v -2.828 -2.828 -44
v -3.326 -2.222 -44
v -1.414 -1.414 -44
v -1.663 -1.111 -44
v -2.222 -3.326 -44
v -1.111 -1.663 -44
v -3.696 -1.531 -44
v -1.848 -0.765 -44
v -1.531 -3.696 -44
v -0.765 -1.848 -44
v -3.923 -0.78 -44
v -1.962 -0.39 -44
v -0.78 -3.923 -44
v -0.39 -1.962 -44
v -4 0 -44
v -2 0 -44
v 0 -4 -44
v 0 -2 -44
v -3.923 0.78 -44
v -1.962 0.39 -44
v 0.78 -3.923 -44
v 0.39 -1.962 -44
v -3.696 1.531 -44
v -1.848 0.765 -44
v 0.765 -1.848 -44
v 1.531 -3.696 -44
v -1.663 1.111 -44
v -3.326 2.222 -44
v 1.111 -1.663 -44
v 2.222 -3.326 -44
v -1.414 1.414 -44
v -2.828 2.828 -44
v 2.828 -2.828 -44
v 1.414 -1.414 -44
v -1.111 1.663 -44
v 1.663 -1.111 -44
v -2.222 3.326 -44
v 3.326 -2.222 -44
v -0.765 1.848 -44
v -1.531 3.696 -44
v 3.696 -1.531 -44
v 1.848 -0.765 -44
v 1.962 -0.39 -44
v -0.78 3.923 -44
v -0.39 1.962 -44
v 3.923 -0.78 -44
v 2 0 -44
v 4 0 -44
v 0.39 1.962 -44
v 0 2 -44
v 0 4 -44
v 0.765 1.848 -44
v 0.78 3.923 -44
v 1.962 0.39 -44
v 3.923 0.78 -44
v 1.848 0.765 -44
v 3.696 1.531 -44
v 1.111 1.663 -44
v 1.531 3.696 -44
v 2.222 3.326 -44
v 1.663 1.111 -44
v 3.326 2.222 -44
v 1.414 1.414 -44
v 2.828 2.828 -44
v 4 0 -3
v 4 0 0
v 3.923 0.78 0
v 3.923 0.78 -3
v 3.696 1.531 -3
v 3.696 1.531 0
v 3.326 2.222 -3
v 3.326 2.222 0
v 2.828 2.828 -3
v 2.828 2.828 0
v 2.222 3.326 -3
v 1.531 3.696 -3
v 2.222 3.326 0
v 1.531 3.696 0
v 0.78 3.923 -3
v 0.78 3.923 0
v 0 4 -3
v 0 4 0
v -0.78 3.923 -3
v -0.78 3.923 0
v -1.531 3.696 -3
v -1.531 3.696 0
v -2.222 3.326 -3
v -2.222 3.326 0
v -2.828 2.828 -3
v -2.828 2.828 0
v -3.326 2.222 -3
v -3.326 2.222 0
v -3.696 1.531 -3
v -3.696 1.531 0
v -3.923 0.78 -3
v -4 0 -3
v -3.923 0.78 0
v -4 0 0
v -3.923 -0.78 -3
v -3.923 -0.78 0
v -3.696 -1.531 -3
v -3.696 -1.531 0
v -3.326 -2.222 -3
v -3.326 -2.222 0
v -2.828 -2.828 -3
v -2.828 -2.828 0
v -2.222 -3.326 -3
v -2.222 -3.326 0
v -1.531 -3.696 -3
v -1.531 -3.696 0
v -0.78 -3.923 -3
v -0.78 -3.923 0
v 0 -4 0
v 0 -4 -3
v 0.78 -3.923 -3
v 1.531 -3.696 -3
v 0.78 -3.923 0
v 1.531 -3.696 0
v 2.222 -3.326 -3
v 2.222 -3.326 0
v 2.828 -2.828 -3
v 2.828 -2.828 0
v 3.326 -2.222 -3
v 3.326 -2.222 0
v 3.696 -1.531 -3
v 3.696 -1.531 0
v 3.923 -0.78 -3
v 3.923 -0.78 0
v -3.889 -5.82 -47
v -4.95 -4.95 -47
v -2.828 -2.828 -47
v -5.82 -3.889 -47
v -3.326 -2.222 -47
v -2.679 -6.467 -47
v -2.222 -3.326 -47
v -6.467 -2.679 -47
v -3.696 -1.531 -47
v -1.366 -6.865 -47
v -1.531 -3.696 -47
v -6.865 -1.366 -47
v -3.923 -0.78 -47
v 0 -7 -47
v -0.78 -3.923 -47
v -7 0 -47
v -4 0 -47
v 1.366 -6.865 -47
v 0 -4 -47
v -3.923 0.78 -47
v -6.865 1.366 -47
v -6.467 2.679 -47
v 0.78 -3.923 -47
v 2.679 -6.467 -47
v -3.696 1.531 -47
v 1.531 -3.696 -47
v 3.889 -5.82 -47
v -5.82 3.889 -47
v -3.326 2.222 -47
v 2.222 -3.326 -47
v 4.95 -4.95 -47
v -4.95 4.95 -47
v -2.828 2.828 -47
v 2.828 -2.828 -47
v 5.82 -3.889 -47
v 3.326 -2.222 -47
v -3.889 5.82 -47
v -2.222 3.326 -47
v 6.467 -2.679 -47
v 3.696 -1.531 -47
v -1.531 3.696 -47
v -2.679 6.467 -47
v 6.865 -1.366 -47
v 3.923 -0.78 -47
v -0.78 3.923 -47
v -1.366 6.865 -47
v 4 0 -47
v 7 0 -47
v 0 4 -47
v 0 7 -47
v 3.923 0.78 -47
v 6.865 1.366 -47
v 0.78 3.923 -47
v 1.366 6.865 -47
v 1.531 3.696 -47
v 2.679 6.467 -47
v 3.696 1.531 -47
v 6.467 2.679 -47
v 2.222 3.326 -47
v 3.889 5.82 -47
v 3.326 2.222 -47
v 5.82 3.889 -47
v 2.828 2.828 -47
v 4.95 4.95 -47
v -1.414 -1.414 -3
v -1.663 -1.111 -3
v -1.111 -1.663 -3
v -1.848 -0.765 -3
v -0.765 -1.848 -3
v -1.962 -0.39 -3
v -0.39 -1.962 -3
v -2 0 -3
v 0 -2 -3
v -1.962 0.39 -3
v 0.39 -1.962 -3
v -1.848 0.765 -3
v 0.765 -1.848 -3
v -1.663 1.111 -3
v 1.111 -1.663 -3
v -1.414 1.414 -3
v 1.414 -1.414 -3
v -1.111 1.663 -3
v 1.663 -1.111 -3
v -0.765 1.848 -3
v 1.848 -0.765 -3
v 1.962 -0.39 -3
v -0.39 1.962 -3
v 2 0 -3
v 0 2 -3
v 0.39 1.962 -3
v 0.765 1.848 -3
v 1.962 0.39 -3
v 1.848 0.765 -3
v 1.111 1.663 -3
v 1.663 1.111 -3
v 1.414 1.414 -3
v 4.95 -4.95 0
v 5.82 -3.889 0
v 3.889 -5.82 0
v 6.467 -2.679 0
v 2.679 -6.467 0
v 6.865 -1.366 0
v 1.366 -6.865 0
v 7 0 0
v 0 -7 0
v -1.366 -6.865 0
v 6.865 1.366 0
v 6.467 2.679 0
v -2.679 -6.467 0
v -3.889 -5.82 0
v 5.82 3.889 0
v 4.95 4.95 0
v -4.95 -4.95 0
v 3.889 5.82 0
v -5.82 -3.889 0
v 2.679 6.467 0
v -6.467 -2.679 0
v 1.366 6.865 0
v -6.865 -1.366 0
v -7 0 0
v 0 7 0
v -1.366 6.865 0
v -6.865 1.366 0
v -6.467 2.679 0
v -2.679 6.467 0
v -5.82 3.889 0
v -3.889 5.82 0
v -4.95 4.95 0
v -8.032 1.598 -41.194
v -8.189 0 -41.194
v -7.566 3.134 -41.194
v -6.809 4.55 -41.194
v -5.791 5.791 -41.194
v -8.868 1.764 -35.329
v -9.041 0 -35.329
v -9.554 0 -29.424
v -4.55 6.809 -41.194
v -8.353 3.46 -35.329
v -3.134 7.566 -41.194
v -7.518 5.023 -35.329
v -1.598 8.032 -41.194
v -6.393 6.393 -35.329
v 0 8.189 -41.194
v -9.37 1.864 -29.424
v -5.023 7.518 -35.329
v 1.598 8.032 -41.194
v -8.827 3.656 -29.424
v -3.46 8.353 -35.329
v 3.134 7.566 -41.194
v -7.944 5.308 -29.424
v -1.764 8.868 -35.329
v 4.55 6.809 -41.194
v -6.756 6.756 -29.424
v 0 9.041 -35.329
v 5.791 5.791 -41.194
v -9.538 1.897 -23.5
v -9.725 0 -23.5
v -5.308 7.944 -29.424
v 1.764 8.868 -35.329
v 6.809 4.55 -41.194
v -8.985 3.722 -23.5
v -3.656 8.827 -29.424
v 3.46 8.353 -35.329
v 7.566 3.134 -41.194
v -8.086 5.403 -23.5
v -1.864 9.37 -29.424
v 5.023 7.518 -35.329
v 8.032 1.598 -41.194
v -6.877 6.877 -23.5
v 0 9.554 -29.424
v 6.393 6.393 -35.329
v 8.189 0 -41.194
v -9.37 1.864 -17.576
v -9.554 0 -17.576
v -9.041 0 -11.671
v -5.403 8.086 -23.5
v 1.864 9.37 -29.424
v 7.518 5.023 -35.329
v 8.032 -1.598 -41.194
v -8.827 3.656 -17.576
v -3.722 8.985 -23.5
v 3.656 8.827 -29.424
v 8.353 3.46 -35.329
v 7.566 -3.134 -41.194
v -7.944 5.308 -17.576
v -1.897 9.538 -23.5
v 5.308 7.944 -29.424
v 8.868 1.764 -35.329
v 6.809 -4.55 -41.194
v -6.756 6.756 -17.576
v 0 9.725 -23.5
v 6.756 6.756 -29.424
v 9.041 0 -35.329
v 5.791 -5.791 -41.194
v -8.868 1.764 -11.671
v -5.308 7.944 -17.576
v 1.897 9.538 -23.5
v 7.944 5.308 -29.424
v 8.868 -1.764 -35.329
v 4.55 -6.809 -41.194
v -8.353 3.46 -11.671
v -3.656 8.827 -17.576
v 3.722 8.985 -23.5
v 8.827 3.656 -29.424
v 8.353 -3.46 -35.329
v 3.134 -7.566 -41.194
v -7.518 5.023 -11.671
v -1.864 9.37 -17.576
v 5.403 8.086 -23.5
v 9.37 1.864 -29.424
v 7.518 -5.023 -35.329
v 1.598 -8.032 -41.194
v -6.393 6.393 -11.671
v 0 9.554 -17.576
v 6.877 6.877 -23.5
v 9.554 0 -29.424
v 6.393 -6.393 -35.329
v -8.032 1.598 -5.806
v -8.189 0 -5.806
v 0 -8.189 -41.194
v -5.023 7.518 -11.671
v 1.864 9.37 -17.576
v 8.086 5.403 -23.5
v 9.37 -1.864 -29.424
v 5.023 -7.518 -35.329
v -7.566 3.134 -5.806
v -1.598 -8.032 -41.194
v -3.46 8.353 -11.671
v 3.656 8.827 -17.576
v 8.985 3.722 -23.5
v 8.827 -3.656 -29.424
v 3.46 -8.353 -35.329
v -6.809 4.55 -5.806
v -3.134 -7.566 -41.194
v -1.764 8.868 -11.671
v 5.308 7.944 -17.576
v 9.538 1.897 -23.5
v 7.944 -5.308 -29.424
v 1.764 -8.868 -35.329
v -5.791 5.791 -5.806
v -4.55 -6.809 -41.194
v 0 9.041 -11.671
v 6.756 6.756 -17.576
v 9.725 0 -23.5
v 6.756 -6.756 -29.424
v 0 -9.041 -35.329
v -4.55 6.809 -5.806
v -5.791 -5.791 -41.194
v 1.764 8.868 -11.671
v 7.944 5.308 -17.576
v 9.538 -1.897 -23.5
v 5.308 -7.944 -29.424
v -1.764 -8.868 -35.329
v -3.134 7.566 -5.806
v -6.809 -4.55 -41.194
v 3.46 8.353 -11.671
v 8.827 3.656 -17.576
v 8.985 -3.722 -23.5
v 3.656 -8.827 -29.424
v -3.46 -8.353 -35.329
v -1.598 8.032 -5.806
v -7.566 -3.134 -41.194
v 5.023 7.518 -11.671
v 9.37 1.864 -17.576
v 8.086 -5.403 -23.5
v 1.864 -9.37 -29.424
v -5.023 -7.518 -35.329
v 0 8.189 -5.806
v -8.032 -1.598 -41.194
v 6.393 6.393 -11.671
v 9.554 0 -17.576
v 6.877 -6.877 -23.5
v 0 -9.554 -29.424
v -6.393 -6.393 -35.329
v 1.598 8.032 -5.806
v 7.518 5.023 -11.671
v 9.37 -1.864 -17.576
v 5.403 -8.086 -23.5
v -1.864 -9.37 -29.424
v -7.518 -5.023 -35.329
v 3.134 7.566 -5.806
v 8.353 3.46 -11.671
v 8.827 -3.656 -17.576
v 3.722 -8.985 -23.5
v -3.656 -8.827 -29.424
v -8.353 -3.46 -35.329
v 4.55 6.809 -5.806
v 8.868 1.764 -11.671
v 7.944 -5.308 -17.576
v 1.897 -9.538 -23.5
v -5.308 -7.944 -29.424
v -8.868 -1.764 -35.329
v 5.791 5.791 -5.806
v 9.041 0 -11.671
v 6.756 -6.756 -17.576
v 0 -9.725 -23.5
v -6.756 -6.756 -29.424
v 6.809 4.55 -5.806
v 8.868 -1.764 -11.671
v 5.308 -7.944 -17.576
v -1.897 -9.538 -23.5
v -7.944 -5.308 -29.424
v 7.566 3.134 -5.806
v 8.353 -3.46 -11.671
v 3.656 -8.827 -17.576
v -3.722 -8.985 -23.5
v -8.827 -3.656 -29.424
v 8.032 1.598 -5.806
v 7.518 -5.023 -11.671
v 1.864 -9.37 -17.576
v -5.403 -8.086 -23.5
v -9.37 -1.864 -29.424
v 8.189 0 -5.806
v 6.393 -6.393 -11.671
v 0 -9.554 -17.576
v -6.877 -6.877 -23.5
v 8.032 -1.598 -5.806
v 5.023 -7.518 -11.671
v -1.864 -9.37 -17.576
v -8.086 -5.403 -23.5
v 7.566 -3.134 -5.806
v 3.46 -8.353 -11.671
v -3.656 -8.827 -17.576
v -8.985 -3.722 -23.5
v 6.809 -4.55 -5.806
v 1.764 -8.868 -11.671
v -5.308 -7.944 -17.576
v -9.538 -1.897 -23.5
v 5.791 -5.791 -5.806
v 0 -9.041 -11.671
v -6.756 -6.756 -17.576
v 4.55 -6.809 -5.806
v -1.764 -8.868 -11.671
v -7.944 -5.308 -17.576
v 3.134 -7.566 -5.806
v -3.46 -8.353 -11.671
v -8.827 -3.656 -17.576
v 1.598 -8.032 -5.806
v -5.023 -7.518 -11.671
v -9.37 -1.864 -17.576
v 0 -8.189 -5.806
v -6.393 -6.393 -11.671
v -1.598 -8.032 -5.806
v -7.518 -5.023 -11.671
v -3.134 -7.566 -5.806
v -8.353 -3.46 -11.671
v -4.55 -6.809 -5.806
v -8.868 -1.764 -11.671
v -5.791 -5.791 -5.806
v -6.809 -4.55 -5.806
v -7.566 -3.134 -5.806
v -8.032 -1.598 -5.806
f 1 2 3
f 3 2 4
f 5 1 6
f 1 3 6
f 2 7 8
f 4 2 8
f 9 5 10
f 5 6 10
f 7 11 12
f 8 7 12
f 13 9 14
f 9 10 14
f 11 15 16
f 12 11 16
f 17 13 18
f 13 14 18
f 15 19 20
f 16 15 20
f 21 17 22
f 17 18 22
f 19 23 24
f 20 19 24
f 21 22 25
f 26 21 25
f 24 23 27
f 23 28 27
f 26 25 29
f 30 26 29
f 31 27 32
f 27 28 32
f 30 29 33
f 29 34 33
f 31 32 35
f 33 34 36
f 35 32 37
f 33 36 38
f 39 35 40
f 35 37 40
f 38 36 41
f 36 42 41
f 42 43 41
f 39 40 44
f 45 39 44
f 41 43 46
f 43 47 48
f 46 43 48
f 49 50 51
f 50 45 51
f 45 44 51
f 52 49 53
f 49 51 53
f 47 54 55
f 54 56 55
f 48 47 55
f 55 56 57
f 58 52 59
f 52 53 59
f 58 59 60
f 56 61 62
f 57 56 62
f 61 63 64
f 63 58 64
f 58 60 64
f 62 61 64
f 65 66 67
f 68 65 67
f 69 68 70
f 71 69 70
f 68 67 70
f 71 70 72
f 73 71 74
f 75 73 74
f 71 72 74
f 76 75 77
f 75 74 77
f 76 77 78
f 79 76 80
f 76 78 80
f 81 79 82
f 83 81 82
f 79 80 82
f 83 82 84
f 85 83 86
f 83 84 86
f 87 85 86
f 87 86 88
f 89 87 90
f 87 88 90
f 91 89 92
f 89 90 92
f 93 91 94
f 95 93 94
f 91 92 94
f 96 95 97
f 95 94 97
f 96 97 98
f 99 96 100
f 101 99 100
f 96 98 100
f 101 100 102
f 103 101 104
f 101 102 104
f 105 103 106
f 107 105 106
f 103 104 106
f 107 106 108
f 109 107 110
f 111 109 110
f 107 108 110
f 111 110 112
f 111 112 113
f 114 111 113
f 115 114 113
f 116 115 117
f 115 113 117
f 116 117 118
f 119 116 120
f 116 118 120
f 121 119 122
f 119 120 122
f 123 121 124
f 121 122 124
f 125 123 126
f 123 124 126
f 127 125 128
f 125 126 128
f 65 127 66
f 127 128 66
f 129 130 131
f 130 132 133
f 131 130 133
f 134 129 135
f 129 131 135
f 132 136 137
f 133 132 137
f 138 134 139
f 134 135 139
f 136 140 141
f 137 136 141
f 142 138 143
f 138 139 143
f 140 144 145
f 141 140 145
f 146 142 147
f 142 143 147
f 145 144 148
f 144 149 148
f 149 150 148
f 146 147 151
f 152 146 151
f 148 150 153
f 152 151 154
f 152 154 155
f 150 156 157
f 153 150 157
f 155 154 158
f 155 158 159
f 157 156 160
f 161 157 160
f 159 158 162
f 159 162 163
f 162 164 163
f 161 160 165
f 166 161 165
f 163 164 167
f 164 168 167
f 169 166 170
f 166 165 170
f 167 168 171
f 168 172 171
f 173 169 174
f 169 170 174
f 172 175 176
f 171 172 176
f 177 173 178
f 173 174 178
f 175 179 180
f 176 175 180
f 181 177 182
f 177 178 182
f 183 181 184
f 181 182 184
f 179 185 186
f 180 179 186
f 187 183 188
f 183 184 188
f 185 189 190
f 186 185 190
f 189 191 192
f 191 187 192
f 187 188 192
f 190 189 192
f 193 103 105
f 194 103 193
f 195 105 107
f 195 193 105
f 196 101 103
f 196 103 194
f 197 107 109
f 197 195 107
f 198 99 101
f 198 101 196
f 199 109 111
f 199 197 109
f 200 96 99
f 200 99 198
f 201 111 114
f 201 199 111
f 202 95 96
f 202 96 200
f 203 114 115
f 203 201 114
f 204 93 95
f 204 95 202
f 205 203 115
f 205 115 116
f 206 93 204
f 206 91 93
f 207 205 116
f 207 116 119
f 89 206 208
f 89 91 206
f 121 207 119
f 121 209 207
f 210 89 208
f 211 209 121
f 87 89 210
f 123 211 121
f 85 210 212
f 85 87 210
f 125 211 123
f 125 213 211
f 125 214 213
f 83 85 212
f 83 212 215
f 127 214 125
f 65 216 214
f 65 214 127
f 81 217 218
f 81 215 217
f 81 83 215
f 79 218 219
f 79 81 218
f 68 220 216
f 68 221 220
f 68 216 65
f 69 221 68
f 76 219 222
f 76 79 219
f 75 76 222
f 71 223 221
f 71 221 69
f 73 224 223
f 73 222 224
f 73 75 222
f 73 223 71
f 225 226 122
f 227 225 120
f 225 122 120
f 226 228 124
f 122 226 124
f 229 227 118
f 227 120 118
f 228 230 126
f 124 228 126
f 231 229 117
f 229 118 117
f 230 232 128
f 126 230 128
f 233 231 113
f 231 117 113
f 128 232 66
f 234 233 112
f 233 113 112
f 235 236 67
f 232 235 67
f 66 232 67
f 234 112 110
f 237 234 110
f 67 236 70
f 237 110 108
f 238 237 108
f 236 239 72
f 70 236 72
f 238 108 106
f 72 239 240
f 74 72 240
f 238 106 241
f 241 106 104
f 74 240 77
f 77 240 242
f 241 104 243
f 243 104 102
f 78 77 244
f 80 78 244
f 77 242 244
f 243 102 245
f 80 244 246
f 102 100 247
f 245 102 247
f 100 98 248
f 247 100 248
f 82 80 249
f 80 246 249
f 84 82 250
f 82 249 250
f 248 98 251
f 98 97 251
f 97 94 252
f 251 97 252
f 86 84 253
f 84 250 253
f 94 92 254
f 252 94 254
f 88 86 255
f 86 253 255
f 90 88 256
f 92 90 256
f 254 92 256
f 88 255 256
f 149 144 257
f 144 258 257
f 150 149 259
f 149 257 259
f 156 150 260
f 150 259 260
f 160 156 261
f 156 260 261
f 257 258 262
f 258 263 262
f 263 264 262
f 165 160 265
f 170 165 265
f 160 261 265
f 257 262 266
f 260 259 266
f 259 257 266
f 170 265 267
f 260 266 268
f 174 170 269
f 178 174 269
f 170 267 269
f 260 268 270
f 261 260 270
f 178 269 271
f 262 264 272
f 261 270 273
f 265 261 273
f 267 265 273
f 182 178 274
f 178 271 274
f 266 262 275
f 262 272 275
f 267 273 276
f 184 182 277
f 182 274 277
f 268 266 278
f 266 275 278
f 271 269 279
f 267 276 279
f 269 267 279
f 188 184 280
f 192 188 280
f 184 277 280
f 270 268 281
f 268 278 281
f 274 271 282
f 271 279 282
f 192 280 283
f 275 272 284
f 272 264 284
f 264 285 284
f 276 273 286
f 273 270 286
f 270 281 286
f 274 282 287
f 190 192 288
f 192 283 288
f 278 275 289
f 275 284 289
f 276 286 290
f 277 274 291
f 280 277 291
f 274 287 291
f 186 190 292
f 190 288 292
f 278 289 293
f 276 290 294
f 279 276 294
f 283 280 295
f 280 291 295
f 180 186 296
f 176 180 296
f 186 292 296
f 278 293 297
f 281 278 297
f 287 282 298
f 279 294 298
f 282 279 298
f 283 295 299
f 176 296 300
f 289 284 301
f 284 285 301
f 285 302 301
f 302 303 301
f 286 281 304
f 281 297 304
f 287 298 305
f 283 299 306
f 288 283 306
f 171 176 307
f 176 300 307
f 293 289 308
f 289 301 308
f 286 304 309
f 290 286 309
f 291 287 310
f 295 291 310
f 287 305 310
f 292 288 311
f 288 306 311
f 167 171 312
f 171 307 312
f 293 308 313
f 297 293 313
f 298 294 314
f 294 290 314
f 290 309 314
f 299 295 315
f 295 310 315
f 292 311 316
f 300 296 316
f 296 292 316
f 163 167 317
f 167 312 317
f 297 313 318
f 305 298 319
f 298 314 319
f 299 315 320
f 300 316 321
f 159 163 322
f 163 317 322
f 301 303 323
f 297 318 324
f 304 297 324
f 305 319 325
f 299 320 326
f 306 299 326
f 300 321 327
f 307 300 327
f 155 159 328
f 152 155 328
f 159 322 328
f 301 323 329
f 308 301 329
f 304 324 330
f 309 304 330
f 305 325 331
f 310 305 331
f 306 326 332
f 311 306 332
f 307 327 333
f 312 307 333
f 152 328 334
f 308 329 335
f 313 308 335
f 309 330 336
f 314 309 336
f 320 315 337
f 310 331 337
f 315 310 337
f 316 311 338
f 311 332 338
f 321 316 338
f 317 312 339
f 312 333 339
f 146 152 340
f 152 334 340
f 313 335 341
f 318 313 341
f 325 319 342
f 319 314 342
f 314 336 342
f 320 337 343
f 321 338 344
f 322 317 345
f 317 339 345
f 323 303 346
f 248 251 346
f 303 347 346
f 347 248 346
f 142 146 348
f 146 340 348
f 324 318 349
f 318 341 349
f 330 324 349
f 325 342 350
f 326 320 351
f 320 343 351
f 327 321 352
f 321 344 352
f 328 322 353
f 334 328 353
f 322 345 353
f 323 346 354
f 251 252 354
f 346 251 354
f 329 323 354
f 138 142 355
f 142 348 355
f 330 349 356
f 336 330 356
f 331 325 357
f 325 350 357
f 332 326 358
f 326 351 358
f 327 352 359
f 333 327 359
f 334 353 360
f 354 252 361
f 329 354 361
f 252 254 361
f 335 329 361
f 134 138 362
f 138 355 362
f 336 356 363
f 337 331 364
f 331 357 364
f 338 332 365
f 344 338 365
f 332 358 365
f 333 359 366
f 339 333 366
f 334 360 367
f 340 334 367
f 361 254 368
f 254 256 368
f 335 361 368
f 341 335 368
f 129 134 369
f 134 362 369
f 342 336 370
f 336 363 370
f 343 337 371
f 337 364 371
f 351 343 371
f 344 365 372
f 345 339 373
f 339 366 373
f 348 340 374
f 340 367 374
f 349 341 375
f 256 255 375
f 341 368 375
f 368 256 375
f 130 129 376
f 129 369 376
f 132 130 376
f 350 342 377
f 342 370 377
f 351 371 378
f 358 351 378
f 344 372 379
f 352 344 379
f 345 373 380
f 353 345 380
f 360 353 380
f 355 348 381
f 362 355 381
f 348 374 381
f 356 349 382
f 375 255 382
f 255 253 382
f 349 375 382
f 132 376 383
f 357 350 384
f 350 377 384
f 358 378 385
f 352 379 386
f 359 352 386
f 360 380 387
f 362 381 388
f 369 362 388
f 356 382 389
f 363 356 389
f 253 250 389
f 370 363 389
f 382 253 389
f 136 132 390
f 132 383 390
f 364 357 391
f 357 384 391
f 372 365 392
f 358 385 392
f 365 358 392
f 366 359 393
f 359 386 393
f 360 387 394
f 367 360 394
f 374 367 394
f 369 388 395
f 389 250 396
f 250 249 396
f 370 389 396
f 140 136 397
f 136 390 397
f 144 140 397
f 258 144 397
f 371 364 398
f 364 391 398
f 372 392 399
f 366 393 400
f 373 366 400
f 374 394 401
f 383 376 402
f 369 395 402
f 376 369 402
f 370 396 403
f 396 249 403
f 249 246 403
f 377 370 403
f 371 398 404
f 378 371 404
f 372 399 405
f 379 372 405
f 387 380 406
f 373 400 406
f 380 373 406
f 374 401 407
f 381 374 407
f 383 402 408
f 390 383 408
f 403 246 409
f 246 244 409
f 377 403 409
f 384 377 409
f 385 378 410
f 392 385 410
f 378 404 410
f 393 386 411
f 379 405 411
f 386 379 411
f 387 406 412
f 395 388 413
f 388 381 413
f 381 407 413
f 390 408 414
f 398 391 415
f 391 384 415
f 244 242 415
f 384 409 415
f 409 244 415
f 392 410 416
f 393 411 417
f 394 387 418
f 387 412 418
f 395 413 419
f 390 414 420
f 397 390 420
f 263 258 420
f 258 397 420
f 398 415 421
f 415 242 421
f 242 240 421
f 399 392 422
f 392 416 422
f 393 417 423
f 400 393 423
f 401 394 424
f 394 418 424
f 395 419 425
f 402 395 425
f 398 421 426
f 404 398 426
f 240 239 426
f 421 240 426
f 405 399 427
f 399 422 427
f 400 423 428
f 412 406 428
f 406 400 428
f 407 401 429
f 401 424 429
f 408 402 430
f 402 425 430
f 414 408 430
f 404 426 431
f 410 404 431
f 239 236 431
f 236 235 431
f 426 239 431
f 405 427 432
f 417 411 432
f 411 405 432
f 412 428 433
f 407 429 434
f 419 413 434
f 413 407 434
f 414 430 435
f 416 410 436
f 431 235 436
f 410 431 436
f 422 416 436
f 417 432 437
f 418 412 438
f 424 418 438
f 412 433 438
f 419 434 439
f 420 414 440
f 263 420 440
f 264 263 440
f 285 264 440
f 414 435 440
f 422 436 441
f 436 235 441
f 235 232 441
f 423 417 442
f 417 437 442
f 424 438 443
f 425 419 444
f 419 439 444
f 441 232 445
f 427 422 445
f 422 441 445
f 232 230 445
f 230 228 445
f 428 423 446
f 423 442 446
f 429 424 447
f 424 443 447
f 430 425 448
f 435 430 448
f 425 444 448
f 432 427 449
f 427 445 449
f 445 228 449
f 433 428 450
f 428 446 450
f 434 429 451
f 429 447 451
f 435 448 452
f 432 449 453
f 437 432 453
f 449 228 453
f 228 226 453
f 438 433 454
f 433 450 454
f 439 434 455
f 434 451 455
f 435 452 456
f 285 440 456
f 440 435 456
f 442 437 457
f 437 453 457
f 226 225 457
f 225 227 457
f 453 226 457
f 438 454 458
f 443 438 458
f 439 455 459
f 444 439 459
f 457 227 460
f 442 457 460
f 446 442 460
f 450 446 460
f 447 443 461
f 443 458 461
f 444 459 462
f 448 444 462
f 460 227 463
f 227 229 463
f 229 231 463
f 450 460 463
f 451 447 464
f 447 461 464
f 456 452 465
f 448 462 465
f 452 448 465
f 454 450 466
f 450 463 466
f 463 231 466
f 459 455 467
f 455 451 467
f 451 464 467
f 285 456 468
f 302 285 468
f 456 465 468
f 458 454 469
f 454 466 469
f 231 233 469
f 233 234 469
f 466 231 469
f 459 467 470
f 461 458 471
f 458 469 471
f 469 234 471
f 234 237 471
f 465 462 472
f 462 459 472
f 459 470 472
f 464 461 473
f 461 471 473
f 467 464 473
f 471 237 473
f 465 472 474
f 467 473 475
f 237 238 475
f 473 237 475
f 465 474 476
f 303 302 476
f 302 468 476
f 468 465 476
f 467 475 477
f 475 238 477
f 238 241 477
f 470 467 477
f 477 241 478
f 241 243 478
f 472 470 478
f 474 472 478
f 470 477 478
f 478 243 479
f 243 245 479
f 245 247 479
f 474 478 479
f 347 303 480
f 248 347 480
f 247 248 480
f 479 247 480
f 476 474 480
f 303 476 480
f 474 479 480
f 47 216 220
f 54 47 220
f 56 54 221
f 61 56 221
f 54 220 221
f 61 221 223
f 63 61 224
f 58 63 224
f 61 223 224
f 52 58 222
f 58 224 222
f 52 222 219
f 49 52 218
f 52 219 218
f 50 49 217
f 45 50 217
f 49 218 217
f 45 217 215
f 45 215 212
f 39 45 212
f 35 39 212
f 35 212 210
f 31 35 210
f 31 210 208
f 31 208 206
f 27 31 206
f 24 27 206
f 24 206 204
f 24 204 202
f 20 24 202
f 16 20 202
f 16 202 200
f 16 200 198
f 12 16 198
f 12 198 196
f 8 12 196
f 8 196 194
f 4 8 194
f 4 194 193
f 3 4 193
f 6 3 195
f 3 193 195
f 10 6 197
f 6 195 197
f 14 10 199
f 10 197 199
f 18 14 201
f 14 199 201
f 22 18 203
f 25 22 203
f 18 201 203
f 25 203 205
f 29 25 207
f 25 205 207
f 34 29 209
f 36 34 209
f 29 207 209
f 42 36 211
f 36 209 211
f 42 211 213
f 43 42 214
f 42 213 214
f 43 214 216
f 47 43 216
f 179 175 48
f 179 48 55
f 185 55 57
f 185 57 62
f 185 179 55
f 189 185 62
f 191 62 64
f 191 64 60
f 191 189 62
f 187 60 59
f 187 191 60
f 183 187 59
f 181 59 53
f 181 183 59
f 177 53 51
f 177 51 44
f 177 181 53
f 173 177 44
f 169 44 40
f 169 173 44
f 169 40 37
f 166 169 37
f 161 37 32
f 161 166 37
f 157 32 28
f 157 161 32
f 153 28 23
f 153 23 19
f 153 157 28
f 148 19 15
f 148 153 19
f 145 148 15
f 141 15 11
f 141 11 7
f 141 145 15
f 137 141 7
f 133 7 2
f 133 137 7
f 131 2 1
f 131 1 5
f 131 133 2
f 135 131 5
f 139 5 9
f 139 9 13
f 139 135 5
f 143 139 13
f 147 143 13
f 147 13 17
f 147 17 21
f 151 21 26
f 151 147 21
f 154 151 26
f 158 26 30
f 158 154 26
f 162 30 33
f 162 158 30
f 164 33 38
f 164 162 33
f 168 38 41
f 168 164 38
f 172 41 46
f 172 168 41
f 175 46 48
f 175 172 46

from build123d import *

# Parameters (mm, degrees)
SKETCH_2_R               = 2
CUT_EXTRUDE_1_DEPTH      = 1.0000001
CUT_EXTRUDE_1_DEPTH_BACK = 48.0000001
SKETCH_3_R               = 4
CUT_EXTRUDE_2_DEPTH      = 3


with BuildPart() as part:
    # Эскиз1 → Повернуть1 (revolve)
    with BuildSketch(Plane(origin=(0, 0, 0), x_dir=(1, 0, 0), z_dir=(0, 1, 0))):
        with BuildLine():
            Line((0, 0), (0, 47))
            Line((0, 47), (-7, 47))
            ThreePointArc((-7, 47), (-9.725, 23.5), (-7, 0))
            Line((-7, 0), (0, 0))
        make_face()
    revolve(axis=Axis((0, 0, 0), (0, 0, -1)))

    # Эскиз2 → Вырез-Вытянуть1 (cut, two sides)
    with BuildSketch(Plane.XY) as cut_extrude_1_sk:
        Circle(SKETCH_2_R)
    extrude(amount=CUT_EXTRUDE_1_DEPTH, mode=Mode.SUBTRACT)
    extrude(cut_extrude_1_sk.sketch, amount=-CUT_EXTRUDE_1_DEPTH_BACK, mode=Mode.SUBTRACT)

    # Эскиз3 → Вырез-Вытянуть2 (cut)
    with BuildSketch(Plane.XY):
        Circle(SKETCH_3_R)
    cut_extrude_2 = extrude(amount=-CUT_EXTRUDE_2_DEPTH, mode=Mode.SUBTRACT)

    # Зеркальное отражение1: Вырез-Вытянуть2 across plane
    add(cut_extrude_2.mirror(Plane.XY.offset(-23.5)), mode=Mode.SUBTRACT)


solid = part.part
